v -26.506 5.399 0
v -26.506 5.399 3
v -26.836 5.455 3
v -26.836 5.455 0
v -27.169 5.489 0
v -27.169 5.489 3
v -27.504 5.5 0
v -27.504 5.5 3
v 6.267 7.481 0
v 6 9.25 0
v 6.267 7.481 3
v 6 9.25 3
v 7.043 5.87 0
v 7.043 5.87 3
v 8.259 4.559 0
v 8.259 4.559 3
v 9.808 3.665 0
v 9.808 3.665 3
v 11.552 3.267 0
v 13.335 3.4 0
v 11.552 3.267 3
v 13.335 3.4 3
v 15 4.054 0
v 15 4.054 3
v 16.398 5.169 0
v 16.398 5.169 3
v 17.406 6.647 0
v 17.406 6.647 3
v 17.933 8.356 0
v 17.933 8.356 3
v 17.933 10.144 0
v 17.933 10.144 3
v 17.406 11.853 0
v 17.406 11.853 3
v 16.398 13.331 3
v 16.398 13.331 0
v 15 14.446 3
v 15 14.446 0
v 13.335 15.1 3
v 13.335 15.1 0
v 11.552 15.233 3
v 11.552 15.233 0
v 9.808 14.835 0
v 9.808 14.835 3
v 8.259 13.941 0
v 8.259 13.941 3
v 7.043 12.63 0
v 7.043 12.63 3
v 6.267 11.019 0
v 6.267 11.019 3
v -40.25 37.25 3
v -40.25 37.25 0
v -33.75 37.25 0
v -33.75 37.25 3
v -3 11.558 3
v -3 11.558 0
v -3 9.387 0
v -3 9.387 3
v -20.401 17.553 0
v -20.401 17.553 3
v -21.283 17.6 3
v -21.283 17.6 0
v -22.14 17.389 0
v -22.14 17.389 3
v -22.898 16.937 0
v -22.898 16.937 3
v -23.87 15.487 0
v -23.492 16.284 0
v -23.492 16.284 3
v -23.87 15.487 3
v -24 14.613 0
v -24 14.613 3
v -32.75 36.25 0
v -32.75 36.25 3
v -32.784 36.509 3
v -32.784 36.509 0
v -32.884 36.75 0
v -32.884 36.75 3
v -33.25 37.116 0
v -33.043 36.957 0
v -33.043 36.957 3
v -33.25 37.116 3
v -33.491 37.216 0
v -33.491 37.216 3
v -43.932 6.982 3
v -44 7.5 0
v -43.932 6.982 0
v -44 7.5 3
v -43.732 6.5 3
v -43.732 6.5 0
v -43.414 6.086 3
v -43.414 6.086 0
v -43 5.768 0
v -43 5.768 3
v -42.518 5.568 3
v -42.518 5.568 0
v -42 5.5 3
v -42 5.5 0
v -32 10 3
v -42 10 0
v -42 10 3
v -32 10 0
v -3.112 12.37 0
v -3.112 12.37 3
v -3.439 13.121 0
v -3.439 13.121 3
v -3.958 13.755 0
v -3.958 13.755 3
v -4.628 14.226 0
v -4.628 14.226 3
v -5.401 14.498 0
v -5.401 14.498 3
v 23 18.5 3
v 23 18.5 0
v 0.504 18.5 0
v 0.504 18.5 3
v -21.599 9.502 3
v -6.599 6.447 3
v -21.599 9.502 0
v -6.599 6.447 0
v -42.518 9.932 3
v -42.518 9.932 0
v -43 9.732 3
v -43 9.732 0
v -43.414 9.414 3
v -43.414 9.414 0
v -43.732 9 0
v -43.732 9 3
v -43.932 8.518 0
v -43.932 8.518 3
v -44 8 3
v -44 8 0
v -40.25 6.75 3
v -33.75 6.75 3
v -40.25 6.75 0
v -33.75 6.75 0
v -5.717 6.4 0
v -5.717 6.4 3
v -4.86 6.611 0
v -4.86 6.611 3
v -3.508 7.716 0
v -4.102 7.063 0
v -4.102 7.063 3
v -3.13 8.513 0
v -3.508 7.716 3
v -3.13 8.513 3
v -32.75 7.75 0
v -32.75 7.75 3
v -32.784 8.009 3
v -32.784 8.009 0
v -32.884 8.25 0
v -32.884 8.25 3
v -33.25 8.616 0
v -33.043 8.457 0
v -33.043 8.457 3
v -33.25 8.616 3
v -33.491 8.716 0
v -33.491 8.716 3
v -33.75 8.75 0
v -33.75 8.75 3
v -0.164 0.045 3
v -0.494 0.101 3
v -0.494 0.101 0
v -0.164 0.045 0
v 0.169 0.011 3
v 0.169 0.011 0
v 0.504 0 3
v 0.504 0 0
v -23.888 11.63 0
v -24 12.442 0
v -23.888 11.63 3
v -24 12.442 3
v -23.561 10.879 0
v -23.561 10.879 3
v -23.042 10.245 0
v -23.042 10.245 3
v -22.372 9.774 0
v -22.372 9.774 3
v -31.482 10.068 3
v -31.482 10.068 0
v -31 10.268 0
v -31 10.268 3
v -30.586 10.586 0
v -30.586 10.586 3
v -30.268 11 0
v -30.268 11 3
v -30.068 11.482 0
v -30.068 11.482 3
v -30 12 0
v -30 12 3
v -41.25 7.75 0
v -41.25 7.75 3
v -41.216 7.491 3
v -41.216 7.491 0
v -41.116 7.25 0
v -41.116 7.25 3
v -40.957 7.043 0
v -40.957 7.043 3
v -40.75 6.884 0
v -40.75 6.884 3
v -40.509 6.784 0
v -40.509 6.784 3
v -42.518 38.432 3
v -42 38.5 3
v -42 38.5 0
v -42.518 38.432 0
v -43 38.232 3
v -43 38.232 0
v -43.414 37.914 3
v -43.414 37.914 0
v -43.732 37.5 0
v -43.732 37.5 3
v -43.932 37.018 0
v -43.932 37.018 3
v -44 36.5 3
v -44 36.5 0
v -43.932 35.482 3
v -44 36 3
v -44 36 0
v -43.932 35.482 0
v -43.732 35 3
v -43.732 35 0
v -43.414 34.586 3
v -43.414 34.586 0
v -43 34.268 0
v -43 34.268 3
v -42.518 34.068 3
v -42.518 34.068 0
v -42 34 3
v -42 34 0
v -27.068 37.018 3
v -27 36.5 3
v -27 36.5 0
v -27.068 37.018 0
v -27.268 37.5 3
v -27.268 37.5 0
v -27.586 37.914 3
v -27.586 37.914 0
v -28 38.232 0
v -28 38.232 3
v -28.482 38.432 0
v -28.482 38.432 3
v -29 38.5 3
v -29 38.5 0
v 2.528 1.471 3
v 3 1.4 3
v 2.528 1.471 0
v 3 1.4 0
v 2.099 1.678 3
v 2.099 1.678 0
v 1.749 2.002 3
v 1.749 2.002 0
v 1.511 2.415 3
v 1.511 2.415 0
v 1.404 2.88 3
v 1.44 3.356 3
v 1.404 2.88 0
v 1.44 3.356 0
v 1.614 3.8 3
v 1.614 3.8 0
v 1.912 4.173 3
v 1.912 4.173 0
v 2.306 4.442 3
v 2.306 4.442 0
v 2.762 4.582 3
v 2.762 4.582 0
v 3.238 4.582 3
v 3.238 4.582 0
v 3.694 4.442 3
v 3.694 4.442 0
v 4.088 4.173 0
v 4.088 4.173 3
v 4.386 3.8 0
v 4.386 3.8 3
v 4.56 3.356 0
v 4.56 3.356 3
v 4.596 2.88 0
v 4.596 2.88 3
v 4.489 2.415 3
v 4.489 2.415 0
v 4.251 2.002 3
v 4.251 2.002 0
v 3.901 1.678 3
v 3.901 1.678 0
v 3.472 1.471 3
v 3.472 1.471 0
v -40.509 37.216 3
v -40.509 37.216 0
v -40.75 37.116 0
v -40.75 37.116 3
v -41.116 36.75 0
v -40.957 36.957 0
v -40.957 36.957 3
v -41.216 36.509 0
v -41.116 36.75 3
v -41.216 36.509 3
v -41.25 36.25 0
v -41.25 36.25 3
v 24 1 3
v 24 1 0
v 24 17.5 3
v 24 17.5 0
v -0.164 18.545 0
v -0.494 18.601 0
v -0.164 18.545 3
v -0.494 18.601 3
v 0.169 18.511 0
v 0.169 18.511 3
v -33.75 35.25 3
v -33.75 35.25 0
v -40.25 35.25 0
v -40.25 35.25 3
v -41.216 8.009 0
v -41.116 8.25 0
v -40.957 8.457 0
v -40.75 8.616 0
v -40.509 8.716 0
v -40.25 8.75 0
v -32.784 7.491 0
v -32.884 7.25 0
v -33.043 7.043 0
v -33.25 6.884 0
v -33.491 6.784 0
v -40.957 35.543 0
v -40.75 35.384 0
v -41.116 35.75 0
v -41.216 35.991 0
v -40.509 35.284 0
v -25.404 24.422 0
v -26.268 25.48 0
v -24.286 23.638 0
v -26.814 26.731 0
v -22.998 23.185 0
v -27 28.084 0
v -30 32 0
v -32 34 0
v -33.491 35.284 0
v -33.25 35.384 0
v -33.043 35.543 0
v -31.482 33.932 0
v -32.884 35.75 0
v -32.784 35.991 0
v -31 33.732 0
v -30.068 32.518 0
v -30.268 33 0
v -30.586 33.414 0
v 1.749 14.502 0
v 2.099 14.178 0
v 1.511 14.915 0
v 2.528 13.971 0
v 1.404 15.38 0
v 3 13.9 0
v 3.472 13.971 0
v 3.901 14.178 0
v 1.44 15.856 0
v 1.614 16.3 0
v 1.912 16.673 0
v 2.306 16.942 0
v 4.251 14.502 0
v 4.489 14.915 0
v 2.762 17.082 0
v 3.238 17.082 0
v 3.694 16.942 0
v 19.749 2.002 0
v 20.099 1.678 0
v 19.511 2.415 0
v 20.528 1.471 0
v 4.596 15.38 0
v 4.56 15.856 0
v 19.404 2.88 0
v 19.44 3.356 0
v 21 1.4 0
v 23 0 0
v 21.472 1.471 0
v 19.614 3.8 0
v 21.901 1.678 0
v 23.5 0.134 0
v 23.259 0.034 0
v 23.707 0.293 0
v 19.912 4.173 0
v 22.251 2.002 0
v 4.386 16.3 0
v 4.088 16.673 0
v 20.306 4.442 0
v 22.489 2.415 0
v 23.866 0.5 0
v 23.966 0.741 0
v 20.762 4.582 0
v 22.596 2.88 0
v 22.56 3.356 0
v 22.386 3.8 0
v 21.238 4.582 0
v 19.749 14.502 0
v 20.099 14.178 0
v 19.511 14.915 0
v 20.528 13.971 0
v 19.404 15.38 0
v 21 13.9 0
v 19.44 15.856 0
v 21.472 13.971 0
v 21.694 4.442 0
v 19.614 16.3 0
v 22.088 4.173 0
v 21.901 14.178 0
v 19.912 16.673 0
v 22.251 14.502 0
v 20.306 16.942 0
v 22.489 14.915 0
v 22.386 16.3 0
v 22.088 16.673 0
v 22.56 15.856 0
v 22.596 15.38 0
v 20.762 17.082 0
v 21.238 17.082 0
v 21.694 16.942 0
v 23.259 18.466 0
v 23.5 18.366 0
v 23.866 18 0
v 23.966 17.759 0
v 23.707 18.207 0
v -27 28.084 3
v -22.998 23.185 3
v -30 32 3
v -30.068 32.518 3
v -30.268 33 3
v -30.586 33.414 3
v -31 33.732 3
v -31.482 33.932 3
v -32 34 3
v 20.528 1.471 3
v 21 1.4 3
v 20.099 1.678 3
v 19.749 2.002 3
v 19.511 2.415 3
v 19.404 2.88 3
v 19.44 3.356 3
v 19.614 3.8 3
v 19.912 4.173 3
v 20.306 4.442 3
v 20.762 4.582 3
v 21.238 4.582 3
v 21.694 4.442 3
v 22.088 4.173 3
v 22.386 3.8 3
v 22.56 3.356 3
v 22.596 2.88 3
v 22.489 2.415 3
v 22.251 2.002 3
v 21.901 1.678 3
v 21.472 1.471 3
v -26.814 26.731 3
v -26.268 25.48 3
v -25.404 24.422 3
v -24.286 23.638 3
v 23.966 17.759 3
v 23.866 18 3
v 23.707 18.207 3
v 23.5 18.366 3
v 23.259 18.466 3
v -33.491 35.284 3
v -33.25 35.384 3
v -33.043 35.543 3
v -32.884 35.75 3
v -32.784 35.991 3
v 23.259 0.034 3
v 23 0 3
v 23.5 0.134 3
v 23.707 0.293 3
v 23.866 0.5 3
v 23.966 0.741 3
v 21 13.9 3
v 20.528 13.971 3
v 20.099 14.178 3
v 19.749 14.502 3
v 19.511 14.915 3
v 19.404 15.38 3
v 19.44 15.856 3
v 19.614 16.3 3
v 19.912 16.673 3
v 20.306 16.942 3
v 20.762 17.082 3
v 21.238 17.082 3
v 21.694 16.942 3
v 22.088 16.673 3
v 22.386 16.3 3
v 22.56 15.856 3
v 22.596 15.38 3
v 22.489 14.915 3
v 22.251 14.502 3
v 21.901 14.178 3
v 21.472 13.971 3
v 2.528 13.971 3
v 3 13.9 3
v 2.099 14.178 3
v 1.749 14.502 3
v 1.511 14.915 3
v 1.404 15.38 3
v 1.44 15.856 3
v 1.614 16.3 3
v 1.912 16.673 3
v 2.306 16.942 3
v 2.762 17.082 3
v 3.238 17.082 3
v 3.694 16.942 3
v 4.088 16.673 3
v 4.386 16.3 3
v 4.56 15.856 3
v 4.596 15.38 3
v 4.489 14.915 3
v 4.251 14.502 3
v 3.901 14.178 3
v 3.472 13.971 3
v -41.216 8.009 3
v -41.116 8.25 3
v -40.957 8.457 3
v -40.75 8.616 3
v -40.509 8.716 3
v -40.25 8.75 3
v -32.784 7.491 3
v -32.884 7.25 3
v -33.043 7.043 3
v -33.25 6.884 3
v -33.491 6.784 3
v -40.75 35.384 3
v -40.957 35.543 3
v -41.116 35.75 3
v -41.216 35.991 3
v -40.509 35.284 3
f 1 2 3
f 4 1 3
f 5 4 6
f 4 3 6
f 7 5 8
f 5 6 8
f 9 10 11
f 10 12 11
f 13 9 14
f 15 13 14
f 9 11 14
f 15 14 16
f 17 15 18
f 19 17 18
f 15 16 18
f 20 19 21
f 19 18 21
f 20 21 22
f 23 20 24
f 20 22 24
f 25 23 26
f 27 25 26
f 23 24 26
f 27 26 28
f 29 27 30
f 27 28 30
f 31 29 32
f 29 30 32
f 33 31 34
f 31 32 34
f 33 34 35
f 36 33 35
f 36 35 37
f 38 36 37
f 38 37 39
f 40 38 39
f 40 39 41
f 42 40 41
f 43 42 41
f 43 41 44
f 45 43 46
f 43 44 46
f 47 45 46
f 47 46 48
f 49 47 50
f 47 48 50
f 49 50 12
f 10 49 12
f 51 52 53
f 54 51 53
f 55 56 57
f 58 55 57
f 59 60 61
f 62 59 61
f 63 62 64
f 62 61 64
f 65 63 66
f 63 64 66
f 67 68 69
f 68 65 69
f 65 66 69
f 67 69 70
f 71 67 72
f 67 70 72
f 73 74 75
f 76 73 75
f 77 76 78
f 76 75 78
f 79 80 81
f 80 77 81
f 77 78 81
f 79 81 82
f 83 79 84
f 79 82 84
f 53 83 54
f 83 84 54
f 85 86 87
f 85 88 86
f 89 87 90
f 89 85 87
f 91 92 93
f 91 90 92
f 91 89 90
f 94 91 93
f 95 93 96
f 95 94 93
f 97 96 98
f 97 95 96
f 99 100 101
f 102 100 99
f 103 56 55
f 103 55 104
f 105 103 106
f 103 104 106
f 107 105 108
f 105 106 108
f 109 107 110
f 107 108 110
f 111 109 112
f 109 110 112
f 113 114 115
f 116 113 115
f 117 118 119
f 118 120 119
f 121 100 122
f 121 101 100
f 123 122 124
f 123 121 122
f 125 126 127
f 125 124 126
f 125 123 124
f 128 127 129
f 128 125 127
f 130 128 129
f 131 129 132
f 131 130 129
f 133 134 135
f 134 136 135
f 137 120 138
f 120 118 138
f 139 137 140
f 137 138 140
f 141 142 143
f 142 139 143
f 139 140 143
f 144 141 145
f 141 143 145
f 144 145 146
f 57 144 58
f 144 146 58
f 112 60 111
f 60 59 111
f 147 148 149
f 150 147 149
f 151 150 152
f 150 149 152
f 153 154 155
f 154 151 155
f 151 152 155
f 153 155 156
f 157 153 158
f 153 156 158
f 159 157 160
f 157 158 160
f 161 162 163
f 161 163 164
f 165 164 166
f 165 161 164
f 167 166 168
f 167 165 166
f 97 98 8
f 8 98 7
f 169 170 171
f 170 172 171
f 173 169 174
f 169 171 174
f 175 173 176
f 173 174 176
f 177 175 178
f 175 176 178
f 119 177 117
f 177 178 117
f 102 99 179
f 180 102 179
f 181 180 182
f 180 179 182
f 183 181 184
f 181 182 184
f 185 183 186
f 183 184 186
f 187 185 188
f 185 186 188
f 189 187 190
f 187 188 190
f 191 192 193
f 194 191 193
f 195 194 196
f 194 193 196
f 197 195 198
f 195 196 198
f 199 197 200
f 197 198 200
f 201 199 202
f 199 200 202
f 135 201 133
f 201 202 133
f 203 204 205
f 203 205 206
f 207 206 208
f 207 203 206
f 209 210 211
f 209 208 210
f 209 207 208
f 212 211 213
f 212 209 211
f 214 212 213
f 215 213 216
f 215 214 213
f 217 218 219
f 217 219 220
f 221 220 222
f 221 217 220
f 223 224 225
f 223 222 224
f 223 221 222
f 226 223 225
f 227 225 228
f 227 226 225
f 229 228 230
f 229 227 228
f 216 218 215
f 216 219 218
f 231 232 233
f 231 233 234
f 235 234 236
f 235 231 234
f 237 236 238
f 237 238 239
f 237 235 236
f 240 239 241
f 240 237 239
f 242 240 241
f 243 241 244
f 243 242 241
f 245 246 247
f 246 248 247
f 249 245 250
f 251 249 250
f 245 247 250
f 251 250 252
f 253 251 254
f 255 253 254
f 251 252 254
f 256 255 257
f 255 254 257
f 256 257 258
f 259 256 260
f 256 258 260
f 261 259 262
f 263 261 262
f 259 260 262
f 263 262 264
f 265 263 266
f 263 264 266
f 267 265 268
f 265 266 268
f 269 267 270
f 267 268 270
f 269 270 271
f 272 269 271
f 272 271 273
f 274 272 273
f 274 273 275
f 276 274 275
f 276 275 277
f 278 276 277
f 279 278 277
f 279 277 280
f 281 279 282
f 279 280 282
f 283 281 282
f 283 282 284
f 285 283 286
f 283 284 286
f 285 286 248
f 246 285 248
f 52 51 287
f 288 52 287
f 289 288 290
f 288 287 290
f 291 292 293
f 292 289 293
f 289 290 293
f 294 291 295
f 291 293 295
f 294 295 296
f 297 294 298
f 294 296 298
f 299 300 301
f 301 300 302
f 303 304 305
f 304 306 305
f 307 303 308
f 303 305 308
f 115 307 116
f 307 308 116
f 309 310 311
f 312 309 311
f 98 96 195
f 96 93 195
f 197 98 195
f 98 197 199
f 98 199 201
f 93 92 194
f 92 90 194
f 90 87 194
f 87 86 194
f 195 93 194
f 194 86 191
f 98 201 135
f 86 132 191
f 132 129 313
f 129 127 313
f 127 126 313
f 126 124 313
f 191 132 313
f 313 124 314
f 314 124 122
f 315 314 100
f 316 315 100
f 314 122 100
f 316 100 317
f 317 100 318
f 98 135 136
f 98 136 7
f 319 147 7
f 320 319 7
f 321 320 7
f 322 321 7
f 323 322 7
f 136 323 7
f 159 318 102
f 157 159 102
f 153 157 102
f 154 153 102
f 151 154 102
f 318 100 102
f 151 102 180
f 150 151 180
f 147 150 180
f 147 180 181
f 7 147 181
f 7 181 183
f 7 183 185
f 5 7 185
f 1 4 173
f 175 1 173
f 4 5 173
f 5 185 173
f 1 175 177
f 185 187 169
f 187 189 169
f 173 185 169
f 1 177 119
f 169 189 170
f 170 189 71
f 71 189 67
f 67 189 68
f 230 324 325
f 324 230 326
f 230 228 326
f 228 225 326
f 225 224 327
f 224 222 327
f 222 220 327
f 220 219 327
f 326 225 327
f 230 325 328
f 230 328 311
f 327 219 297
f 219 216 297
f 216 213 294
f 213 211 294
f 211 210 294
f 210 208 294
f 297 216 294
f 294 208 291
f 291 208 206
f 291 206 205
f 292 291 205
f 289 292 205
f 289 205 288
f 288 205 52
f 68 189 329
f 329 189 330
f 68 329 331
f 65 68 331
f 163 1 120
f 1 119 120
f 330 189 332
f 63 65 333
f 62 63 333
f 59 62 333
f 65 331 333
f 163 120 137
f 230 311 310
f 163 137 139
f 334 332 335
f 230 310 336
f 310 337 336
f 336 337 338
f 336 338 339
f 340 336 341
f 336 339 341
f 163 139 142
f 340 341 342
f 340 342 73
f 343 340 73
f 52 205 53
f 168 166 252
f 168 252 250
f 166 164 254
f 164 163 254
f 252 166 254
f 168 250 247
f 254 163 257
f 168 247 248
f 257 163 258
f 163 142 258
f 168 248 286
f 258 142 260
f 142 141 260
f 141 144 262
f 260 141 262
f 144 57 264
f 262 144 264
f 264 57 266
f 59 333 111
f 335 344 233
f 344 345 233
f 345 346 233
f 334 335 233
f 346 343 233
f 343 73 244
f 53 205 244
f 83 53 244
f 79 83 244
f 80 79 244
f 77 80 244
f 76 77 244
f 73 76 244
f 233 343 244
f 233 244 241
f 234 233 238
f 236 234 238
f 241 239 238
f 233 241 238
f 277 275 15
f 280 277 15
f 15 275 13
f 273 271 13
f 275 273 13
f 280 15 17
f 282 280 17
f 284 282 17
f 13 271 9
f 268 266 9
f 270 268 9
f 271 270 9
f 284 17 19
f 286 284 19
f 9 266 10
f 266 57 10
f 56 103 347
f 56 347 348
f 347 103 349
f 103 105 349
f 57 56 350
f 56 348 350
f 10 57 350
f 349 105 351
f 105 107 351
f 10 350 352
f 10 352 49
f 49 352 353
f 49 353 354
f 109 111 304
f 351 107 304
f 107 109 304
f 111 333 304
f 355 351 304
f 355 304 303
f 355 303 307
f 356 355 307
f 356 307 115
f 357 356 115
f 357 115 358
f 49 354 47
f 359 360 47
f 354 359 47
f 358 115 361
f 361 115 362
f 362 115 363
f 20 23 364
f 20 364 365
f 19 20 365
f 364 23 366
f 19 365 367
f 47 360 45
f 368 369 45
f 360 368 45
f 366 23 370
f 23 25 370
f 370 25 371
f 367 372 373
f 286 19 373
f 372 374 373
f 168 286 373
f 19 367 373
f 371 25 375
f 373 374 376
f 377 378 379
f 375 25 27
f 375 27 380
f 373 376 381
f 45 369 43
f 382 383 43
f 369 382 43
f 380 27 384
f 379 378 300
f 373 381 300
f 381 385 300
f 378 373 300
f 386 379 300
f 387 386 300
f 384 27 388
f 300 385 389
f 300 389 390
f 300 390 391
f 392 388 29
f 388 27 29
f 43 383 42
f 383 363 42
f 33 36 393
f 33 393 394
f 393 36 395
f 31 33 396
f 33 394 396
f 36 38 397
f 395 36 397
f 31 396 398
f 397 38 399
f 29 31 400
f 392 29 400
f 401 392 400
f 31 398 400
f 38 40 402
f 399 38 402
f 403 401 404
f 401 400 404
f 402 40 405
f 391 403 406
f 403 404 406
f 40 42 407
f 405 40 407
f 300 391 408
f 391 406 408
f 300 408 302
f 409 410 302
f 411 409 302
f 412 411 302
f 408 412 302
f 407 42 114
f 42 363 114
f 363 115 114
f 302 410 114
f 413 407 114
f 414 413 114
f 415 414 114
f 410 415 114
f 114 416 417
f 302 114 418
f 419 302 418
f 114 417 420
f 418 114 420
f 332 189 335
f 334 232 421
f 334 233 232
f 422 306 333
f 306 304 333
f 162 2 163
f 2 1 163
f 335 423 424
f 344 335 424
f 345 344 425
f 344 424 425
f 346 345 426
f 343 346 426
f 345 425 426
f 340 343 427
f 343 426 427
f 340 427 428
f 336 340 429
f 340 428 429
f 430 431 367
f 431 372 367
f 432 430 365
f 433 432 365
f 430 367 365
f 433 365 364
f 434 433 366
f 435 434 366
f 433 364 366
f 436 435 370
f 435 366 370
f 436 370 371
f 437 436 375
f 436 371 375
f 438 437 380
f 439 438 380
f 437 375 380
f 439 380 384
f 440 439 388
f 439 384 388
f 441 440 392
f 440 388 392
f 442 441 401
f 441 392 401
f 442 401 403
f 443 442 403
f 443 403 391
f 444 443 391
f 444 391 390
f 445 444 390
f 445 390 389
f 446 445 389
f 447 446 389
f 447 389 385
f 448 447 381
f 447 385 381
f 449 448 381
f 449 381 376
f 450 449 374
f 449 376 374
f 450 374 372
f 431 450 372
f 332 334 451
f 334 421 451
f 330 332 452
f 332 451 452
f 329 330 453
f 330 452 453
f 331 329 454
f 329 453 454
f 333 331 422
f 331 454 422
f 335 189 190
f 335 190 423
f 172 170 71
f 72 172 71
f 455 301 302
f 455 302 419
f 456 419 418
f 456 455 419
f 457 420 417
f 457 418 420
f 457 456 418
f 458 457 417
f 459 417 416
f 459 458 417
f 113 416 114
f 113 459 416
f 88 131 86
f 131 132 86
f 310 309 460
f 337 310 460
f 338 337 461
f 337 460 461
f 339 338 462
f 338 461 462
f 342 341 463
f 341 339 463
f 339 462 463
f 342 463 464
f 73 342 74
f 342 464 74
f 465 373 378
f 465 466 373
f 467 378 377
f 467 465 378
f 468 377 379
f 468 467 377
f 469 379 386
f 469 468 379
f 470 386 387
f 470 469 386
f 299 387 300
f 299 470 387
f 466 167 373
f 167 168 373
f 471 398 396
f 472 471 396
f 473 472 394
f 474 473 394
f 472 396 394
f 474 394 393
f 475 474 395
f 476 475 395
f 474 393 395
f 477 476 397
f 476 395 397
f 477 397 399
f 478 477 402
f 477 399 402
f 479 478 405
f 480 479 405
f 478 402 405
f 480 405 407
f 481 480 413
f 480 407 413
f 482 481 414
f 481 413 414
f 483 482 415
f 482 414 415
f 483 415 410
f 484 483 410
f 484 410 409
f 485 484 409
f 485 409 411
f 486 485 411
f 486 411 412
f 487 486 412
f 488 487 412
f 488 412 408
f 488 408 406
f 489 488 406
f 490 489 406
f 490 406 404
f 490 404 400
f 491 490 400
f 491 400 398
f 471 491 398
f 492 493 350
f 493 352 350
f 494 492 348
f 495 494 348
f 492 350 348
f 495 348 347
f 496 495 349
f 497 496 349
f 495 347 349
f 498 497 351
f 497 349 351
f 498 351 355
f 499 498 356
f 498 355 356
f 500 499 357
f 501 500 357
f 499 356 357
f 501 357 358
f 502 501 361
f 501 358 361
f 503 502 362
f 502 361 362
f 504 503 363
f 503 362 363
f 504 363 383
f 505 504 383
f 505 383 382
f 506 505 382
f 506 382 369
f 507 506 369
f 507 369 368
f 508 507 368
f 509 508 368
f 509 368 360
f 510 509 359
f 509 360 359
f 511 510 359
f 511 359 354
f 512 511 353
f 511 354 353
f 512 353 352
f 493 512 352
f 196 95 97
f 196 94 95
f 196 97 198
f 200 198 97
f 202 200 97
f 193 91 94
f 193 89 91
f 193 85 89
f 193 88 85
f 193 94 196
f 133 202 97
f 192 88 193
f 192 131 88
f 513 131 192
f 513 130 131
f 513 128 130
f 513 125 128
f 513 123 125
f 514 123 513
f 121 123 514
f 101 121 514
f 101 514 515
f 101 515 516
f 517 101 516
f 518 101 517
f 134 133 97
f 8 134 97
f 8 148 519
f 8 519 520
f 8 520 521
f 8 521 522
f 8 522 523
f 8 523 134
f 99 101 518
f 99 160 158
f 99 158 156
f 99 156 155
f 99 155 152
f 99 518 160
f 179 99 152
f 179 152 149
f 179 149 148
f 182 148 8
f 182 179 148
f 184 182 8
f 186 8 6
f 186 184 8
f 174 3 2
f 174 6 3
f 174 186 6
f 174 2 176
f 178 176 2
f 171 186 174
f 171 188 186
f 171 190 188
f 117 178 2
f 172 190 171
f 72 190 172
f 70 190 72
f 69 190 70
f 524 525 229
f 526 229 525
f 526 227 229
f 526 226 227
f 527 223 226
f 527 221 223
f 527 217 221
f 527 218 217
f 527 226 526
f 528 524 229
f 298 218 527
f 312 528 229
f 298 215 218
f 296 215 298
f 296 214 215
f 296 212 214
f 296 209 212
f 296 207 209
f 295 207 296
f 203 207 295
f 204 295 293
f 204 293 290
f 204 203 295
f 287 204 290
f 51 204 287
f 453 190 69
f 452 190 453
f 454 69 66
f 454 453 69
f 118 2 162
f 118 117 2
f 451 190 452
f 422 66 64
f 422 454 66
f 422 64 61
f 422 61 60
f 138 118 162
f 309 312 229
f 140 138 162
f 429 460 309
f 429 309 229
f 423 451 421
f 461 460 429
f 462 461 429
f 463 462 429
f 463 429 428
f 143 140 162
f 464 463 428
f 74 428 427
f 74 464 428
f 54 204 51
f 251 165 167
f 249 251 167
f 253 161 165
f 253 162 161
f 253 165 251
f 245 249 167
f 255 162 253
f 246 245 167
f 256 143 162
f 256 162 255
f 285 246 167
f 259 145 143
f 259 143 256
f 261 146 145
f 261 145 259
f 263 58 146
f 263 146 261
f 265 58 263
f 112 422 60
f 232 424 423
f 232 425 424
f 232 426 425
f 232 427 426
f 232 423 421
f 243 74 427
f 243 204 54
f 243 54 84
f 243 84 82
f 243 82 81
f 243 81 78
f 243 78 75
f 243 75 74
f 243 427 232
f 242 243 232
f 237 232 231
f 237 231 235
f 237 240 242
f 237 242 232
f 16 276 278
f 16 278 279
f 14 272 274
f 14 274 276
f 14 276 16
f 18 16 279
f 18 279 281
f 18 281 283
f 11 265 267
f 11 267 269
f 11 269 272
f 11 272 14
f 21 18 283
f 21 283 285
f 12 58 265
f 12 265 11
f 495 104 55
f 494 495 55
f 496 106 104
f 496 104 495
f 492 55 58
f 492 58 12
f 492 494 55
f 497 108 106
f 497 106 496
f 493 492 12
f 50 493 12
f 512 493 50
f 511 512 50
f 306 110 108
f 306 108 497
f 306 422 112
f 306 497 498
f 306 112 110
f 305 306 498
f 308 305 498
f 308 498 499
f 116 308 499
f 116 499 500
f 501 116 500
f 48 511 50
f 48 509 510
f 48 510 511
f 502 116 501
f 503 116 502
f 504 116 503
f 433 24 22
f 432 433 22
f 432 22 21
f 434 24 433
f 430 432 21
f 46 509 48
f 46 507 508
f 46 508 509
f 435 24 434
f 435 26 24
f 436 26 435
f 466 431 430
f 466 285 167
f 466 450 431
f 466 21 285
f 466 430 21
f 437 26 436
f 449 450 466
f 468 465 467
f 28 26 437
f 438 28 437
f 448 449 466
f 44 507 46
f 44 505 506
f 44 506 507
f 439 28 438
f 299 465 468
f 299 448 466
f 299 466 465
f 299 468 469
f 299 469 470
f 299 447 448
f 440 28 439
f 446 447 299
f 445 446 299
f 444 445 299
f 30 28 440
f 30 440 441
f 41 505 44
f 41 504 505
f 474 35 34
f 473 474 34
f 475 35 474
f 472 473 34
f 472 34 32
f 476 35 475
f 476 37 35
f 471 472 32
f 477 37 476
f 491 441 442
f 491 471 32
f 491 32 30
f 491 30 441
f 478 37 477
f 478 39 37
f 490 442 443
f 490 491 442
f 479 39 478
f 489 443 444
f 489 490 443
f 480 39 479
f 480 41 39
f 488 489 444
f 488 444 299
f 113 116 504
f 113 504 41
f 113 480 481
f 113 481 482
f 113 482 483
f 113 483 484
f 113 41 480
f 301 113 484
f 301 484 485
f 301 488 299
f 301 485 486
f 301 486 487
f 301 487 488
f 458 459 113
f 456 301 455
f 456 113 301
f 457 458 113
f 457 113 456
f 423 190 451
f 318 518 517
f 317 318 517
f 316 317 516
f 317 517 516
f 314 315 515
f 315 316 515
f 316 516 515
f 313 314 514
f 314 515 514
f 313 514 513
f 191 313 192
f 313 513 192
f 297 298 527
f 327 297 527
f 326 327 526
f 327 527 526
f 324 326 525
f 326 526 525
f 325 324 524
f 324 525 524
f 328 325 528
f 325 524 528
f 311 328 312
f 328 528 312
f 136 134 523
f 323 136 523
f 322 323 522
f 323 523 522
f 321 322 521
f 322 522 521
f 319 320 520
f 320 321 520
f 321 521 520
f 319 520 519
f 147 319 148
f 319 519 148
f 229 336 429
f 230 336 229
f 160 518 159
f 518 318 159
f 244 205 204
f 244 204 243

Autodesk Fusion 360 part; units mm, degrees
sketch "Sketch24" plane through (0, 0, 0) normal (0, 0, 1) x (1, 0, 0)
  line L0 (0, 0) -> (24, 0)
  line L1 (24, 0) -> (24, 18.5)
  line L2 (24, 18.5) -> (0, 18.5)
  line L3 (0, 18.5) -> (0, 0)
  dimension "d200" = 24
  dimension "d201" = 18.5
sketch "Sketch25" plane through (0, 0, 0) normal (0, 0, 1) x (1, 0, 0)
  line L0 (0, 0) -> (24, 0)
  line L1 (0, 18.5) -> (0, 0)
extrude "Extrude16" add sketch "Sketch24" along normal blind 3
sketch "Sketch26" plane through (0, 0, 3) normal (0, 0, 1) x (-1, 0, 0)
  line L0 (0, -18.5) -> (0, 0)
  line L1 (0, 0) -> (-24, 0)
  line L2 (-24, 0) -> (-24, -18.5)
  line L3 (-24, -18.5) -> (0, -18.5)
  point P0 (-3, -3)
  dimension "d206" = 3
  dimension "d207" = 3
hole "Hole7" at (3, 3, 3) direction (0, 0, -1) diameter 3.2 depth 3 tip angle 118
pattern_linear "R-Pattern3" count 2 spacing 18 along (1, 0, 0) count 2 spacing 12.5 along (0, 1, 0) of "Hole7"
sketch "Sketch27" plane through (0, 0, 0) normal (0, 0, 1) x (1, 0, 0)
  line L0 (-44, 10) -> (-30, 10)
  line L1 (-30, 10) -> (-30, 34)
  line L2 (-30, 34) -> (-44, 34)
  line L3 (-44, 34) -> (-44, 10) construction
  line L4 (-41.25, 37.25) -> (-32.75, 37.25)
  line L5 (-32.75, 37.25) -> (-32.75, 35.25)
  line L6 (-32.75, 35.25) -> (-41.25, 35.25)
  line L7 (-41.25, 35.25) -> (-41.25, 37.25)
  line L8 (-41.25, 8.75) -> (-32.75, 8.75)
  line L9 (-32.75, 8.75) -> (-32.75, 6.75)
  line L10 (-32.75, 6.75) -> (-41.25, 6.75)
  line L11 (-41.25, 6.75) -> (-41.25, 8.75)
  line L12 (-44, 34) -> (-44, 38.5)
  line L13 (-44, 38.5) -> (-27, 38.5)
  line L14 (-44, 10) -> (-44, 5.5)
  line L15 (-44, 5.5) -> (-27, 5.5)
  line L16 (-27, 5.5) -> (0, 0)
  line L17 (0, 0) -> (0, 18.5)
  line L18 (0, 18.5) -> (-27, 24)
  line L19 (-27, 24) -> (-27, 5.5) construction
  line L20 (-27, 38.5) -> (-27, 24)
  line L21 (-24, 18.2862) -> (-3, 14.0084)
  line L22 (-3, 14.0084) -> (-3, 5.7138)
  line L23 (-3, 5.7138) -> (-24, 9.9916)
  line L24 (-24, 9.9916) -> (-24, 18.2862)
  dimension "d215" = 14
  dimension "d216" = 24
  dimension "d217" = 30
  dimension "d218" = 10
  dimension "d219" = 8.5
  dimension "d220" = 2
  dimension "d221" = 2.75
  dimension "d222" = 1.25
  dimension "d223" = 8.5
  dimension "d224" = 2
  dimension "d225" = 2.75
  dimension "d226" = 1.25
  dimension "d227" = 4.5
  dimension "d228" = 17
  dimension "d229" = 4.5
  dimension "d230" = 17
  dimension "d231" = 18.5
  dimension "d232" = 3
  dimension "d233" = 3
  dimension "d235" = 5
  dimension "d236" = 5
extrude "Extrude17" add sketch "Sketch27" along normal blind 3
fillet "Fillet20" radius 1 2 edges at (24, 0, 1.5) (24, 18.5, 1.5)
fillet "Fillet21" radius 3 4 edges at (-24, 18.2862, 1.5) (-3, 14.0084, 1.5) (-3, 5.7138, 1.5) (-24, 9.9916, 1.5)
fillet "Fillet22" radius 5 4 edges at (0, 18.5, 1.5) (0, 0, 1.5) (-27, 5.5, 1.5) (-27, 24, 1.5)
fillet "Fillet23" radius 2 7 edges at (-44, 38.5, 1.5) (-44, 34, 1.5) (-44, 10, 1.5) (-44, 5.5, 1.5) (-27, 38.5, 1.5) (-30, 34, 1.5) (-30, 10, 1.5)
fillet "Fillet24" radius 1 8 edges at (-32.75, 37.25, 1.5) (-32.75, 35.25, 1.5) (-41.25, 35.25, 1.5) (-41.25, 37.25, 1.5) (-41.25, 8.75, 1.5) (-41.25, 6.75, 1.5) (-32.75, 6.75, 1.5) (-32.75, 8.75, 1.5)
sketch "Sketch28" plane through (0, 0, 3) normal (0, 0, 1) x (-1, 0, 0)
  arc A0 (27, -36.5) -> (29, -38.5) centre (29, -36.5) ccw
  line L0 (29, -38.5) -> (42, -38.5)
  arc A1 (42, -38.5) -> (44, -36.5) centre (42, -36.5) ccw
  line L1 (44, -36.5) -> (44, -36)
  arc A2 (44, -36) -> (42, -34) centre (42, -36) ccw
  line L2 (42, -34) -> (32, -34)
  arc A3 (30, -32) -> (32, -34) centre (32, -32) ccw
  line L3 (30, -32) -> (30, -12)
  arc A4 (32, -10) -> (30, -12) centre (32, -12) ccw
  line L4 (32, -10) -> (42, -10)
  arc A5 (42, -10) -> (44, -8) centre (42, -8) ccw
  line L5 (44, -8) -> (44, -7.5)
  arc A6 (44, -7.5) -> (42, -5.5) centre (42, -7.5) ccw
  line L6 (42, -5.5) -> (27.5041, -5.5)
  arc A7 (26.5061, -5.3994) -> (27.5041, -5.5) centre (27.5041, -0.5) ccw
  line L7 (26.5061, -5.3994) -> (0.4939, -0.1006)
  arc A8 (0.4939, -0.1006) -> (-0.5041, 0) centre (-0.5041, -5) ccw
  line L8 (-0.5041, 0) -> (-23, 0)
  arc A9 (-23, 0) -> (-24, -1) centre (-23, -1) ccw
  line L9 (-24, -1) -> (-24, -17.5)
  arc A10 (-24, -17.5) -> (-23, -18.5) centre (-23, -17.5) ccw
  line L10 (-23, -18.5) -> (-0.5041, -18.5)
  arc A11 (0.4939, -18.6006) -> (-0.5041, -18.5) centre (-0.5041, -23.5) ccw
  line L11 (0.4939, -18.6006) -> (22.998, -23.1848)
  arc A12 (27, -28.0842) -> (22.998, -23.1848) centre (22, -28.0842) ccw
  line L12 (27, -28.0842) -> (27, -36.5)
  line L13 (33.75, -6.75) -> (40.25, -6.75)
  arc A13 (40.25, -8.75) -> (40.25, -6.75) centre (40.25, -7.75) ccw
  line L14 (40.25, -8.75) -> (33.75, -8.75)
  arc A14 (33.75, -6.75) -> (33.75, -8.75) centre (33.75, -7.75) ccw
  line L15 (6.5988, -6.4469) -> (21.5988, -9.5024)
  arc A15 (24, -12.4421) -> (21.5988, -9.5024) centre (21, -12.4421) ccw
  line L16 (24, -12.4421) -> (24, -14.6135)
  arc A16 (20.4012, -17.5531) -> (24, -14.6135) centre (21, -14.6135) ccw
  line L17 (20.4012, -17.5531) -> (5.4012, -14.4976)
  arc A17 (3, -11.5579) -> (5.4012, -14.4976) centre (6, -11.5579) ccw
  line L18 (3, -11.5579) -> (3, -9.3865)
  arc A18 (6.5988, -6.4469) -> (3, -9.3865) centre (6, -9.3865) ccw
  line L19 (33.75, -35.25) -> (40.25, -35.25)
  arc A19 (41.25, -36.25) -> (40.25, -35.25) centre (40.25, -36.25) ccw
  arc A20 (40.25, -37.25) -> (41.25, -36.25) centre (40.25, -36.25) ccw
  line L20 (40.25, -37.25) -> (33.75, -37.25)
  arc A21 (32.75, -36.25) -> (33.75, -37.25) centre (33.75, -36.25) ccw
  arc A22 (33.75, -35.25) -> (32.75, -36.25) centre (33.75, -36.25) ccw
  circle A23 centre (-21, -15.5) radius 1.6
  circle A24 centre (-3, -15.5) radius 1.6
  circle A25 centre (-21, -3) radius 1.6
  circle A26 centre (-3, -3) radius 1.6
  circle A27 centre (-12, -9.25) radius 6
  point P0 (-12, -9.25)
  dimension "d249" = 12
  dimension "d250" = 9.25
  dimension "d251" = 12
extrude "Extrude18" cut sketch "Sketch28" against normal blind 3 contours A27
equation "d250 = ( 18.5 / 2 ) * 1 mm"
